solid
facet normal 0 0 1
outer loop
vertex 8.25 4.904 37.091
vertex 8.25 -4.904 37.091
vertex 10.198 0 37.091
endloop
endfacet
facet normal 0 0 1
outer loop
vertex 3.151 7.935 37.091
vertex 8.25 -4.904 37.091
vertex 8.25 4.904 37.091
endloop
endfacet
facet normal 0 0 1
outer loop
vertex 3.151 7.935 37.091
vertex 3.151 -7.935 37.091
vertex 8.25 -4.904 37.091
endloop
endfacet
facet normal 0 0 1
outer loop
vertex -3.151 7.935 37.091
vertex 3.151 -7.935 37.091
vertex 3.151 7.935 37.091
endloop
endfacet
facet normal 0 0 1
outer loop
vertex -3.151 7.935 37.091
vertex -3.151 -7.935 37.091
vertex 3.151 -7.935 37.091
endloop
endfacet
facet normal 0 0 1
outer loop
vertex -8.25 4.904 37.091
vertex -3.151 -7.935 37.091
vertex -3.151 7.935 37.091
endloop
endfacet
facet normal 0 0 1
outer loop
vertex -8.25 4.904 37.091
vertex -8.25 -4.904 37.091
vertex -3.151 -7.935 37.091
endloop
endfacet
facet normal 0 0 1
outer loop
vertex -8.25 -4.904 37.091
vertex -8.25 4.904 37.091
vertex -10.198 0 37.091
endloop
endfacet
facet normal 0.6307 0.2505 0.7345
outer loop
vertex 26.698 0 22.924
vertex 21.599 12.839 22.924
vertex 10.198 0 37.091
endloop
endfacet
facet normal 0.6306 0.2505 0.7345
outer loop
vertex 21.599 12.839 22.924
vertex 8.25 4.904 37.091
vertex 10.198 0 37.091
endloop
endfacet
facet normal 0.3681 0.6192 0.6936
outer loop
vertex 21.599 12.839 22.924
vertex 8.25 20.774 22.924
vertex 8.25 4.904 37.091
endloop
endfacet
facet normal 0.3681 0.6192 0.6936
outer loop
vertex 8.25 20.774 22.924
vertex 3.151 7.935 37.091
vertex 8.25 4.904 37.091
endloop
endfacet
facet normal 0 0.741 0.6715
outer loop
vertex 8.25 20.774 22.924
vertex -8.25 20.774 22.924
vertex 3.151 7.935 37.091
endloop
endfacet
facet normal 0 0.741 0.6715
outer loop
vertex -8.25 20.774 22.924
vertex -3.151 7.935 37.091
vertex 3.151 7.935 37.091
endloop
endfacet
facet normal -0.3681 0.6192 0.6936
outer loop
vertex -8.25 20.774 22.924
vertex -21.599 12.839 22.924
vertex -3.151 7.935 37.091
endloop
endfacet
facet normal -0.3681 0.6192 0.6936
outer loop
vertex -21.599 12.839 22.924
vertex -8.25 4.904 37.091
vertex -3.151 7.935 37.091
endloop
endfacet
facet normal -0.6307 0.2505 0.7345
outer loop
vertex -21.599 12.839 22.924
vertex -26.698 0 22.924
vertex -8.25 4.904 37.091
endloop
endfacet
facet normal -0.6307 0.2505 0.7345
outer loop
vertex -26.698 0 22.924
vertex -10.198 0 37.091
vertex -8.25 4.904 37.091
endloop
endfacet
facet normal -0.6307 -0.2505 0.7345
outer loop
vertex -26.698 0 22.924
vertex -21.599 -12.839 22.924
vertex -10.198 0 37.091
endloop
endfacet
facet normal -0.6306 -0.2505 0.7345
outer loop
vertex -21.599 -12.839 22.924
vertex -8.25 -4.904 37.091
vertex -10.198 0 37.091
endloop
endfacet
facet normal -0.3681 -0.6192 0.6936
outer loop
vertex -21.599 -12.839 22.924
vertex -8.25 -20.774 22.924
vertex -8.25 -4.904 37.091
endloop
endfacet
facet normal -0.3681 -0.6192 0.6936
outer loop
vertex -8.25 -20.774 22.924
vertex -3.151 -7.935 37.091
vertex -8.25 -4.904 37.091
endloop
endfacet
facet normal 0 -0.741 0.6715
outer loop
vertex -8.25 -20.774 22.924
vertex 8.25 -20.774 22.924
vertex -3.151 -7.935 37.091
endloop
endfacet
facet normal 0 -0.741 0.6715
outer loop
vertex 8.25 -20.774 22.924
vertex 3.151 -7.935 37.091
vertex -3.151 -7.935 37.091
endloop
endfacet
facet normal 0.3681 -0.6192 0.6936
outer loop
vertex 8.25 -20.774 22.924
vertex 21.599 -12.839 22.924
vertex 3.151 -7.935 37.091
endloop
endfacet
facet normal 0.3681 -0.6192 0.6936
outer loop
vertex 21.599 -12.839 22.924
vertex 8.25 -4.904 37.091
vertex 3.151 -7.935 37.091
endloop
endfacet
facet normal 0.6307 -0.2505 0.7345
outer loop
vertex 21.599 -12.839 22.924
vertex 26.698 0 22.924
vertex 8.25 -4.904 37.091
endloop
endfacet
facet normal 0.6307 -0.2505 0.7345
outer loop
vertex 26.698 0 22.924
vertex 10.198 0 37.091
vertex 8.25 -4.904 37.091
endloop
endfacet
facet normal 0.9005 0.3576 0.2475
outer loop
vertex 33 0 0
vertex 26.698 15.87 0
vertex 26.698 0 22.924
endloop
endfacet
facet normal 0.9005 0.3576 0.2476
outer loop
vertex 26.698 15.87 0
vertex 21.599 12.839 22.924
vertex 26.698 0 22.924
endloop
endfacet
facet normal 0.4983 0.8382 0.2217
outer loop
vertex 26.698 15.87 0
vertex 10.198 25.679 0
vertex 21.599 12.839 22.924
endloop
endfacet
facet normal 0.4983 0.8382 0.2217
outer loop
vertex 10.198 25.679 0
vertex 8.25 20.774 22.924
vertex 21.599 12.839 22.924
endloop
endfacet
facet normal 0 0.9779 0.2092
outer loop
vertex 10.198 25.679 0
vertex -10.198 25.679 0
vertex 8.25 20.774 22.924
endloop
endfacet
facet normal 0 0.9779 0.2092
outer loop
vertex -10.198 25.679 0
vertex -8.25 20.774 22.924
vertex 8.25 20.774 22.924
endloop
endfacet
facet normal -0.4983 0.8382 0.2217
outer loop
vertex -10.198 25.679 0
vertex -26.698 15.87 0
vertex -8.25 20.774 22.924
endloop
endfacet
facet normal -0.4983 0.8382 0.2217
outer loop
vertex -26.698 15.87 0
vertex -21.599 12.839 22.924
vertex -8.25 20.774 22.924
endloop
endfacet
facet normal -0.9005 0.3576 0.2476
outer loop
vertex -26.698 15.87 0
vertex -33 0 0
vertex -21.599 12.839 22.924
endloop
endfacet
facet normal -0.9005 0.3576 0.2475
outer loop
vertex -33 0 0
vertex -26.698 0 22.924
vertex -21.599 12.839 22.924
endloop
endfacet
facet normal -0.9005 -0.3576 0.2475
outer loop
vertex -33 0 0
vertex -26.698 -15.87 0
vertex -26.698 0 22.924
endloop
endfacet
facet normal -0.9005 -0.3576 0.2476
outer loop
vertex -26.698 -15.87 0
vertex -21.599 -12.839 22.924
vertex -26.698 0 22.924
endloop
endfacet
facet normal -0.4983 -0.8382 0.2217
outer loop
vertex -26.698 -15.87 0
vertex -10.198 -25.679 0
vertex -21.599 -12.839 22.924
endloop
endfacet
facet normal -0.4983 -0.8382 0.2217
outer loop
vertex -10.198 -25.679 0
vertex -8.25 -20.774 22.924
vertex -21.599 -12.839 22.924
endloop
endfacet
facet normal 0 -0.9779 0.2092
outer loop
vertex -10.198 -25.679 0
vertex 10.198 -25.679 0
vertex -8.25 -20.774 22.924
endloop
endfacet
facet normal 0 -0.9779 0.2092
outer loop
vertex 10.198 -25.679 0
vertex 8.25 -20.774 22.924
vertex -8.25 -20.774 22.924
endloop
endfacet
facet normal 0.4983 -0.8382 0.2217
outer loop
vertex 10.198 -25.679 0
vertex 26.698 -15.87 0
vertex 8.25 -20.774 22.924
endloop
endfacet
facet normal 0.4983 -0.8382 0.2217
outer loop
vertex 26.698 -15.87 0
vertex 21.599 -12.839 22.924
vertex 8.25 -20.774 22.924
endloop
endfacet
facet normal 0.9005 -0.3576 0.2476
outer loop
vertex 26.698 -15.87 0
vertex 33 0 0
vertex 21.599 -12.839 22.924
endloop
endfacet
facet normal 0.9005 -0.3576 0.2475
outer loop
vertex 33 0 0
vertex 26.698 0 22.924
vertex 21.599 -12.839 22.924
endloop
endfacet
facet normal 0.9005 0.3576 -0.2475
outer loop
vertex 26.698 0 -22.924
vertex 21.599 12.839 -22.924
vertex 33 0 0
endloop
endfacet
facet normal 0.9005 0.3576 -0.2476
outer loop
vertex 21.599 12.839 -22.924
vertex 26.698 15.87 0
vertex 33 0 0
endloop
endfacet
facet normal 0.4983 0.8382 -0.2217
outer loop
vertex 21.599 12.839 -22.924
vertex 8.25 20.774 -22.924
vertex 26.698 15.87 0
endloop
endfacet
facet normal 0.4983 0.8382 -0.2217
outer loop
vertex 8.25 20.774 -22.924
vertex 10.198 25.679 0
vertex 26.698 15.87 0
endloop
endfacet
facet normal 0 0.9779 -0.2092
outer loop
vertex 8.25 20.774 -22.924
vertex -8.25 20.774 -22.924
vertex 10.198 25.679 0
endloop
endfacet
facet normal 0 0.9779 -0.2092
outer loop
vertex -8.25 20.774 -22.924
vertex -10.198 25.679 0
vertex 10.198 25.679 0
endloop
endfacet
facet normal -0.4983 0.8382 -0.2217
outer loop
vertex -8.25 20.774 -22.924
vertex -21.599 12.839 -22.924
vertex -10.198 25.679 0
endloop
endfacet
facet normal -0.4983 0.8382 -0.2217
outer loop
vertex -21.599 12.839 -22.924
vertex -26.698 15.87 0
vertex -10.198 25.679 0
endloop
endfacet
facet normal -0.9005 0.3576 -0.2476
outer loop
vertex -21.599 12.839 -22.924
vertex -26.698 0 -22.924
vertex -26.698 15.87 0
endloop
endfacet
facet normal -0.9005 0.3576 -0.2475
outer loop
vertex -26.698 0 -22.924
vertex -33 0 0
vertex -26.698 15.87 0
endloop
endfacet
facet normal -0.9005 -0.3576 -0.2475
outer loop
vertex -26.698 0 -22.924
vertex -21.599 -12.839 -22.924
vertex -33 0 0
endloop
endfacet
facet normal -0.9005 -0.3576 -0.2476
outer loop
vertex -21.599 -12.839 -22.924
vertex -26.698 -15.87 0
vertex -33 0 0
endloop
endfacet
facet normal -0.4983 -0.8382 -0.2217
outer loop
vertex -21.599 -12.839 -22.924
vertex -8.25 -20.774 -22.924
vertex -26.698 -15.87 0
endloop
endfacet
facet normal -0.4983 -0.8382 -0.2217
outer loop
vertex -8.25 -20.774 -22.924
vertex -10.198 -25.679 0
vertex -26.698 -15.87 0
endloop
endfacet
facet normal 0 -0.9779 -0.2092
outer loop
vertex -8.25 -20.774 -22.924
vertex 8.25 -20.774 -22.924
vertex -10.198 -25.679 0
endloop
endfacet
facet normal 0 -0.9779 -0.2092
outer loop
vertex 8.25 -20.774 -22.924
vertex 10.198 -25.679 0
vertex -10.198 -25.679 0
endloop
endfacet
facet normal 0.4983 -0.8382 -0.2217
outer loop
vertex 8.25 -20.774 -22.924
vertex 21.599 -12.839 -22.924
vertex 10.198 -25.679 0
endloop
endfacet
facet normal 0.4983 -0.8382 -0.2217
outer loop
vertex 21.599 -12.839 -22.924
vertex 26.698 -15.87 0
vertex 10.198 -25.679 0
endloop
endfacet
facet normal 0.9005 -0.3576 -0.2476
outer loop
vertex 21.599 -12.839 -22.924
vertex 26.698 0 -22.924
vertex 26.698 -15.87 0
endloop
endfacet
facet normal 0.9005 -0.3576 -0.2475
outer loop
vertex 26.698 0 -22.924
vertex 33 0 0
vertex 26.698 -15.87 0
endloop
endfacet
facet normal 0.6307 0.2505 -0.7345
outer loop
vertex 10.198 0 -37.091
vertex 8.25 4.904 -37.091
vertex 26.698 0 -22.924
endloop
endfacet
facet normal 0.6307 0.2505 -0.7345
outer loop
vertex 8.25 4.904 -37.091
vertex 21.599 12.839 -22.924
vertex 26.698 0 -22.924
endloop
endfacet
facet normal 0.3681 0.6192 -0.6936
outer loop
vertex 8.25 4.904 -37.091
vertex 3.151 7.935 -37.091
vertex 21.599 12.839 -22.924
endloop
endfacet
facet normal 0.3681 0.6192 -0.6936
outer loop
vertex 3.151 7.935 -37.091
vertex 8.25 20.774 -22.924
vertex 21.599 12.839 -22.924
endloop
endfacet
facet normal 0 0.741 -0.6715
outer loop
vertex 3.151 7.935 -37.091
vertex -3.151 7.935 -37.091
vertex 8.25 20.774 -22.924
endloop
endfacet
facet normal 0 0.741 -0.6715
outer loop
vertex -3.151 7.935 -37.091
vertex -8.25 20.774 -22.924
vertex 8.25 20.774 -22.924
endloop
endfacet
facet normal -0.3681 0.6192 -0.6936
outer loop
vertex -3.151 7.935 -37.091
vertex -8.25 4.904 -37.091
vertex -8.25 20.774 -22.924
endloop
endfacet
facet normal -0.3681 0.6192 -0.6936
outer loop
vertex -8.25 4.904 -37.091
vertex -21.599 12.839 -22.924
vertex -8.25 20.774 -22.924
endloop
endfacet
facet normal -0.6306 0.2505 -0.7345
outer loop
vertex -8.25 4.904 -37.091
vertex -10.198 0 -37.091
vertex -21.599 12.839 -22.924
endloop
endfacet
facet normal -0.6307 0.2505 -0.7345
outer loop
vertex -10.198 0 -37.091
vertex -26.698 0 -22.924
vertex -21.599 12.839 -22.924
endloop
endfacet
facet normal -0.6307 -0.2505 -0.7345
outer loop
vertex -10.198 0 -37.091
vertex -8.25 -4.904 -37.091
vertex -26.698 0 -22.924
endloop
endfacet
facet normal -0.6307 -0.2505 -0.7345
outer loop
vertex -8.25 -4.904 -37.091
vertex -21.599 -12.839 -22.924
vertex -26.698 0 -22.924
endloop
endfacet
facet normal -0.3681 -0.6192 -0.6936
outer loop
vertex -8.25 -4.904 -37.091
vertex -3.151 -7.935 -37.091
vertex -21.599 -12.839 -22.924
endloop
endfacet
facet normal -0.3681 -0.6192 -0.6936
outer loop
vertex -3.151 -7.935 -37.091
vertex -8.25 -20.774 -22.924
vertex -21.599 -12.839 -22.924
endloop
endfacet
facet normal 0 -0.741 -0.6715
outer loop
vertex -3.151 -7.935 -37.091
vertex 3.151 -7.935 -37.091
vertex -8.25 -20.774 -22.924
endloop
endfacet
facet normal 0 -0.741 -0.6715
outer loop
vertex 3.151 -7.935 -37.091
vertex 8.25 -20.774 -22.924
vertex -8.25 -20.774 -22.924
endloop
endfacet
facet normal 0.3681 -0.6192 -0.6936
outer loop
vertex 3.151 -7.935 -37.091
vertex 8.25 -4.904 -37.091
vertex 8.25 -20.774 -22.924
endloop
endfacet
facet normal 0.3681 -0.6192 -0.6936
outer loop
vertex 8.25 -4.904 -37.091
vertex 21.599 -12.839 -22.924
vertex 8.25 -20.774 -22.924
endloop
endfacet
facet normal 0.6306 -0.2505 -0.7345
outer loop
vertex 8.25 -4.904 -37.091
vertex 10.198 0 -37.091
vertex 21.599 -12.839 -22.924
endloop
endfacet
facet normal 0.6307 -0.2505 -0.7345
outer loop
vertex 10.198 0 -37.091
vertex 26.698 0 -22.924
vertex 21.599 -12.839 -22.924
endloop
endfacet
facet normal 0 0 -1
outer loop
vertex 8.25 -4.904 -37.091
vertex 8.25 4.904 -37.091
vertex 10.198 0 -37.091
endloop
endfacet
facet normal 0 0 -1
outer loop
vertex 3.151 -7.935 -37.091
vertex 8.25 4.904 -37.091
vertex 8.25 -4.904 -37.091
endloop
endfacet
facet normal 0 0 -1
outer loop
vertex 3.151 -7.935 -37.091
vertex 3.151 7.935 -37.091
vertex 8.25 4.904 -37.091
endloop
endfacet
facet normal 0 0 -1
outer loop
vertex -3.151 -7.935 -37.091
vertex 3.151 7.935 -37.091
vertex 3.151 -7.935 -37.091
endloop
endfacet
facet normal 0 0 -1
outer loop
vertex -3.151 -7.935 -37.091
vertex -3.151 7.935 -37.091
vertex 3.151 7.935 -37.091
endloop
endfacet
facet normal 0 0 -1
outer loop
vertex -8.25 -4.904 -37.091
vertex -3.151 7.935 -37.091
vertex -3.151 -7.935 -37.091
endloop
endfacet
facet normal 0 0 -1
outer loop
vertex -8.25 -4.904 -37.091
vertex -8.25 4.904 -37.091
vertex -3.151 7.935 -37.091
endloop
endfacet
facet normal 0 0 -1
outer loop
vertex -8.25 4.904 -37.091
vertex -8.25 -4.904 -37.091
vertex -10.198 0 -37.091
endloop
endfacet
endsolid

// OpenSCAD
// Generated by SolidPython 1.0.1 on 2020-07-29 00:46:49


scale(v = [11, 9, 13]) {
	sphere(r = 3);
}
/***********************************************
*********      SolidPython code:      **********
************************************************
 
# import packages: SolidPython
from solid import *
from solid.utils import *
from itertools import chain, combinations, permutations


class Resize:

    def __init__(self, scad_file):
        self.scad_file = scad_file
        #self.scad_file = import_scad(scad_file)
        # cone/cylinder param:
        self.r1 = 0
        self.r2 = 0
        self.h = 0
        # rectangular prism param:
        self.w = 0
        self.l = 0
        # ellipse param:
        self.r = 0

    # import OpenScad code (file name corresponds to shape)


    # classify shape + parameters
    def assign(self, param1, param2, param3):
        if self.scad_file == 'cone.scad':
            self.r1 = param1
            self.r2 = param2
            self.h = param3
        elif self.scad_file == 'cylinder.scad':
            self.r1 = param1
            self.r2 = param2
            self.h = param3
        elif self.scad_file == 'rectangularPrism.scad':
            self.h = param1
            self.l = param2
            self.w = param3
        else:
            self.r = param1
            self.h = param2

    # resize parameters
    def iterate(self):
        x = range(3, 20, 2)
        i = 1
        if self.scad_file == 'cone.scad':
            tempList = list(permutations(x, 2))
            for temp in tempList:
                param1 = temp[0]
                param2 = temp[1]
                filepath = 'produced_scad_files/' + 'cone' + str(param1) + '_' + str(param2) + '_' + '.scad'
                scad_render_to_file(cylinder(h=param1, r1=param2, r2=0), filepath)

        elif self.scad_file == 'cylinder.scad':
            tempList = list(permutations(x, 3))
            for temp in tempList:
                param1 = temp[0]
                param2 = temp[1]
                filepath = 'produced_scad_files/' + 'cylinder' + str(param1) + '_' + str(param2) + '_' + '.scad'
                scad_render_to_file(cylinder(h=param1, r1=param2, r2=param2), filepath)

        elif self.scad_file == 'rectangularPrism.scad':
            tempList = list(permutations(x, 3))
            for temp in tempList:
                param1 = temp[0]
                param2 = temp[1]
                param3 = temp[2]
                filepath = 'produced_scad_files/' + 'rectangularPrism' + str(param1) + '_' + str(param2) + '_' + str(
                    param3) + '.scad'
                scad_render_to_file(cube(size=(param1, param2, param3)), filepath)

        elif self.scad_file == 'ellipse.scad':
            tempList = list(permutations(x, 4))
            for temp in tempList:
                param1 = temp[0]
                param2 = temp[1]
                param3 = temp[2]
                param4 = temp[3]
                filepath = 'produced_scad_files/' + 'ellipse' + str(param1) + '_' + str(param2) + '_' + str(param3) + '_' + str(param4) + '.scad'
                scad_render_to_file(scale([param1, param2, param3])(sphere(r=param4)), filepath)

    def render_to_scadfile(self):
        scad_render_to_file(scad, 'example.scad') 
 
************************************************/
